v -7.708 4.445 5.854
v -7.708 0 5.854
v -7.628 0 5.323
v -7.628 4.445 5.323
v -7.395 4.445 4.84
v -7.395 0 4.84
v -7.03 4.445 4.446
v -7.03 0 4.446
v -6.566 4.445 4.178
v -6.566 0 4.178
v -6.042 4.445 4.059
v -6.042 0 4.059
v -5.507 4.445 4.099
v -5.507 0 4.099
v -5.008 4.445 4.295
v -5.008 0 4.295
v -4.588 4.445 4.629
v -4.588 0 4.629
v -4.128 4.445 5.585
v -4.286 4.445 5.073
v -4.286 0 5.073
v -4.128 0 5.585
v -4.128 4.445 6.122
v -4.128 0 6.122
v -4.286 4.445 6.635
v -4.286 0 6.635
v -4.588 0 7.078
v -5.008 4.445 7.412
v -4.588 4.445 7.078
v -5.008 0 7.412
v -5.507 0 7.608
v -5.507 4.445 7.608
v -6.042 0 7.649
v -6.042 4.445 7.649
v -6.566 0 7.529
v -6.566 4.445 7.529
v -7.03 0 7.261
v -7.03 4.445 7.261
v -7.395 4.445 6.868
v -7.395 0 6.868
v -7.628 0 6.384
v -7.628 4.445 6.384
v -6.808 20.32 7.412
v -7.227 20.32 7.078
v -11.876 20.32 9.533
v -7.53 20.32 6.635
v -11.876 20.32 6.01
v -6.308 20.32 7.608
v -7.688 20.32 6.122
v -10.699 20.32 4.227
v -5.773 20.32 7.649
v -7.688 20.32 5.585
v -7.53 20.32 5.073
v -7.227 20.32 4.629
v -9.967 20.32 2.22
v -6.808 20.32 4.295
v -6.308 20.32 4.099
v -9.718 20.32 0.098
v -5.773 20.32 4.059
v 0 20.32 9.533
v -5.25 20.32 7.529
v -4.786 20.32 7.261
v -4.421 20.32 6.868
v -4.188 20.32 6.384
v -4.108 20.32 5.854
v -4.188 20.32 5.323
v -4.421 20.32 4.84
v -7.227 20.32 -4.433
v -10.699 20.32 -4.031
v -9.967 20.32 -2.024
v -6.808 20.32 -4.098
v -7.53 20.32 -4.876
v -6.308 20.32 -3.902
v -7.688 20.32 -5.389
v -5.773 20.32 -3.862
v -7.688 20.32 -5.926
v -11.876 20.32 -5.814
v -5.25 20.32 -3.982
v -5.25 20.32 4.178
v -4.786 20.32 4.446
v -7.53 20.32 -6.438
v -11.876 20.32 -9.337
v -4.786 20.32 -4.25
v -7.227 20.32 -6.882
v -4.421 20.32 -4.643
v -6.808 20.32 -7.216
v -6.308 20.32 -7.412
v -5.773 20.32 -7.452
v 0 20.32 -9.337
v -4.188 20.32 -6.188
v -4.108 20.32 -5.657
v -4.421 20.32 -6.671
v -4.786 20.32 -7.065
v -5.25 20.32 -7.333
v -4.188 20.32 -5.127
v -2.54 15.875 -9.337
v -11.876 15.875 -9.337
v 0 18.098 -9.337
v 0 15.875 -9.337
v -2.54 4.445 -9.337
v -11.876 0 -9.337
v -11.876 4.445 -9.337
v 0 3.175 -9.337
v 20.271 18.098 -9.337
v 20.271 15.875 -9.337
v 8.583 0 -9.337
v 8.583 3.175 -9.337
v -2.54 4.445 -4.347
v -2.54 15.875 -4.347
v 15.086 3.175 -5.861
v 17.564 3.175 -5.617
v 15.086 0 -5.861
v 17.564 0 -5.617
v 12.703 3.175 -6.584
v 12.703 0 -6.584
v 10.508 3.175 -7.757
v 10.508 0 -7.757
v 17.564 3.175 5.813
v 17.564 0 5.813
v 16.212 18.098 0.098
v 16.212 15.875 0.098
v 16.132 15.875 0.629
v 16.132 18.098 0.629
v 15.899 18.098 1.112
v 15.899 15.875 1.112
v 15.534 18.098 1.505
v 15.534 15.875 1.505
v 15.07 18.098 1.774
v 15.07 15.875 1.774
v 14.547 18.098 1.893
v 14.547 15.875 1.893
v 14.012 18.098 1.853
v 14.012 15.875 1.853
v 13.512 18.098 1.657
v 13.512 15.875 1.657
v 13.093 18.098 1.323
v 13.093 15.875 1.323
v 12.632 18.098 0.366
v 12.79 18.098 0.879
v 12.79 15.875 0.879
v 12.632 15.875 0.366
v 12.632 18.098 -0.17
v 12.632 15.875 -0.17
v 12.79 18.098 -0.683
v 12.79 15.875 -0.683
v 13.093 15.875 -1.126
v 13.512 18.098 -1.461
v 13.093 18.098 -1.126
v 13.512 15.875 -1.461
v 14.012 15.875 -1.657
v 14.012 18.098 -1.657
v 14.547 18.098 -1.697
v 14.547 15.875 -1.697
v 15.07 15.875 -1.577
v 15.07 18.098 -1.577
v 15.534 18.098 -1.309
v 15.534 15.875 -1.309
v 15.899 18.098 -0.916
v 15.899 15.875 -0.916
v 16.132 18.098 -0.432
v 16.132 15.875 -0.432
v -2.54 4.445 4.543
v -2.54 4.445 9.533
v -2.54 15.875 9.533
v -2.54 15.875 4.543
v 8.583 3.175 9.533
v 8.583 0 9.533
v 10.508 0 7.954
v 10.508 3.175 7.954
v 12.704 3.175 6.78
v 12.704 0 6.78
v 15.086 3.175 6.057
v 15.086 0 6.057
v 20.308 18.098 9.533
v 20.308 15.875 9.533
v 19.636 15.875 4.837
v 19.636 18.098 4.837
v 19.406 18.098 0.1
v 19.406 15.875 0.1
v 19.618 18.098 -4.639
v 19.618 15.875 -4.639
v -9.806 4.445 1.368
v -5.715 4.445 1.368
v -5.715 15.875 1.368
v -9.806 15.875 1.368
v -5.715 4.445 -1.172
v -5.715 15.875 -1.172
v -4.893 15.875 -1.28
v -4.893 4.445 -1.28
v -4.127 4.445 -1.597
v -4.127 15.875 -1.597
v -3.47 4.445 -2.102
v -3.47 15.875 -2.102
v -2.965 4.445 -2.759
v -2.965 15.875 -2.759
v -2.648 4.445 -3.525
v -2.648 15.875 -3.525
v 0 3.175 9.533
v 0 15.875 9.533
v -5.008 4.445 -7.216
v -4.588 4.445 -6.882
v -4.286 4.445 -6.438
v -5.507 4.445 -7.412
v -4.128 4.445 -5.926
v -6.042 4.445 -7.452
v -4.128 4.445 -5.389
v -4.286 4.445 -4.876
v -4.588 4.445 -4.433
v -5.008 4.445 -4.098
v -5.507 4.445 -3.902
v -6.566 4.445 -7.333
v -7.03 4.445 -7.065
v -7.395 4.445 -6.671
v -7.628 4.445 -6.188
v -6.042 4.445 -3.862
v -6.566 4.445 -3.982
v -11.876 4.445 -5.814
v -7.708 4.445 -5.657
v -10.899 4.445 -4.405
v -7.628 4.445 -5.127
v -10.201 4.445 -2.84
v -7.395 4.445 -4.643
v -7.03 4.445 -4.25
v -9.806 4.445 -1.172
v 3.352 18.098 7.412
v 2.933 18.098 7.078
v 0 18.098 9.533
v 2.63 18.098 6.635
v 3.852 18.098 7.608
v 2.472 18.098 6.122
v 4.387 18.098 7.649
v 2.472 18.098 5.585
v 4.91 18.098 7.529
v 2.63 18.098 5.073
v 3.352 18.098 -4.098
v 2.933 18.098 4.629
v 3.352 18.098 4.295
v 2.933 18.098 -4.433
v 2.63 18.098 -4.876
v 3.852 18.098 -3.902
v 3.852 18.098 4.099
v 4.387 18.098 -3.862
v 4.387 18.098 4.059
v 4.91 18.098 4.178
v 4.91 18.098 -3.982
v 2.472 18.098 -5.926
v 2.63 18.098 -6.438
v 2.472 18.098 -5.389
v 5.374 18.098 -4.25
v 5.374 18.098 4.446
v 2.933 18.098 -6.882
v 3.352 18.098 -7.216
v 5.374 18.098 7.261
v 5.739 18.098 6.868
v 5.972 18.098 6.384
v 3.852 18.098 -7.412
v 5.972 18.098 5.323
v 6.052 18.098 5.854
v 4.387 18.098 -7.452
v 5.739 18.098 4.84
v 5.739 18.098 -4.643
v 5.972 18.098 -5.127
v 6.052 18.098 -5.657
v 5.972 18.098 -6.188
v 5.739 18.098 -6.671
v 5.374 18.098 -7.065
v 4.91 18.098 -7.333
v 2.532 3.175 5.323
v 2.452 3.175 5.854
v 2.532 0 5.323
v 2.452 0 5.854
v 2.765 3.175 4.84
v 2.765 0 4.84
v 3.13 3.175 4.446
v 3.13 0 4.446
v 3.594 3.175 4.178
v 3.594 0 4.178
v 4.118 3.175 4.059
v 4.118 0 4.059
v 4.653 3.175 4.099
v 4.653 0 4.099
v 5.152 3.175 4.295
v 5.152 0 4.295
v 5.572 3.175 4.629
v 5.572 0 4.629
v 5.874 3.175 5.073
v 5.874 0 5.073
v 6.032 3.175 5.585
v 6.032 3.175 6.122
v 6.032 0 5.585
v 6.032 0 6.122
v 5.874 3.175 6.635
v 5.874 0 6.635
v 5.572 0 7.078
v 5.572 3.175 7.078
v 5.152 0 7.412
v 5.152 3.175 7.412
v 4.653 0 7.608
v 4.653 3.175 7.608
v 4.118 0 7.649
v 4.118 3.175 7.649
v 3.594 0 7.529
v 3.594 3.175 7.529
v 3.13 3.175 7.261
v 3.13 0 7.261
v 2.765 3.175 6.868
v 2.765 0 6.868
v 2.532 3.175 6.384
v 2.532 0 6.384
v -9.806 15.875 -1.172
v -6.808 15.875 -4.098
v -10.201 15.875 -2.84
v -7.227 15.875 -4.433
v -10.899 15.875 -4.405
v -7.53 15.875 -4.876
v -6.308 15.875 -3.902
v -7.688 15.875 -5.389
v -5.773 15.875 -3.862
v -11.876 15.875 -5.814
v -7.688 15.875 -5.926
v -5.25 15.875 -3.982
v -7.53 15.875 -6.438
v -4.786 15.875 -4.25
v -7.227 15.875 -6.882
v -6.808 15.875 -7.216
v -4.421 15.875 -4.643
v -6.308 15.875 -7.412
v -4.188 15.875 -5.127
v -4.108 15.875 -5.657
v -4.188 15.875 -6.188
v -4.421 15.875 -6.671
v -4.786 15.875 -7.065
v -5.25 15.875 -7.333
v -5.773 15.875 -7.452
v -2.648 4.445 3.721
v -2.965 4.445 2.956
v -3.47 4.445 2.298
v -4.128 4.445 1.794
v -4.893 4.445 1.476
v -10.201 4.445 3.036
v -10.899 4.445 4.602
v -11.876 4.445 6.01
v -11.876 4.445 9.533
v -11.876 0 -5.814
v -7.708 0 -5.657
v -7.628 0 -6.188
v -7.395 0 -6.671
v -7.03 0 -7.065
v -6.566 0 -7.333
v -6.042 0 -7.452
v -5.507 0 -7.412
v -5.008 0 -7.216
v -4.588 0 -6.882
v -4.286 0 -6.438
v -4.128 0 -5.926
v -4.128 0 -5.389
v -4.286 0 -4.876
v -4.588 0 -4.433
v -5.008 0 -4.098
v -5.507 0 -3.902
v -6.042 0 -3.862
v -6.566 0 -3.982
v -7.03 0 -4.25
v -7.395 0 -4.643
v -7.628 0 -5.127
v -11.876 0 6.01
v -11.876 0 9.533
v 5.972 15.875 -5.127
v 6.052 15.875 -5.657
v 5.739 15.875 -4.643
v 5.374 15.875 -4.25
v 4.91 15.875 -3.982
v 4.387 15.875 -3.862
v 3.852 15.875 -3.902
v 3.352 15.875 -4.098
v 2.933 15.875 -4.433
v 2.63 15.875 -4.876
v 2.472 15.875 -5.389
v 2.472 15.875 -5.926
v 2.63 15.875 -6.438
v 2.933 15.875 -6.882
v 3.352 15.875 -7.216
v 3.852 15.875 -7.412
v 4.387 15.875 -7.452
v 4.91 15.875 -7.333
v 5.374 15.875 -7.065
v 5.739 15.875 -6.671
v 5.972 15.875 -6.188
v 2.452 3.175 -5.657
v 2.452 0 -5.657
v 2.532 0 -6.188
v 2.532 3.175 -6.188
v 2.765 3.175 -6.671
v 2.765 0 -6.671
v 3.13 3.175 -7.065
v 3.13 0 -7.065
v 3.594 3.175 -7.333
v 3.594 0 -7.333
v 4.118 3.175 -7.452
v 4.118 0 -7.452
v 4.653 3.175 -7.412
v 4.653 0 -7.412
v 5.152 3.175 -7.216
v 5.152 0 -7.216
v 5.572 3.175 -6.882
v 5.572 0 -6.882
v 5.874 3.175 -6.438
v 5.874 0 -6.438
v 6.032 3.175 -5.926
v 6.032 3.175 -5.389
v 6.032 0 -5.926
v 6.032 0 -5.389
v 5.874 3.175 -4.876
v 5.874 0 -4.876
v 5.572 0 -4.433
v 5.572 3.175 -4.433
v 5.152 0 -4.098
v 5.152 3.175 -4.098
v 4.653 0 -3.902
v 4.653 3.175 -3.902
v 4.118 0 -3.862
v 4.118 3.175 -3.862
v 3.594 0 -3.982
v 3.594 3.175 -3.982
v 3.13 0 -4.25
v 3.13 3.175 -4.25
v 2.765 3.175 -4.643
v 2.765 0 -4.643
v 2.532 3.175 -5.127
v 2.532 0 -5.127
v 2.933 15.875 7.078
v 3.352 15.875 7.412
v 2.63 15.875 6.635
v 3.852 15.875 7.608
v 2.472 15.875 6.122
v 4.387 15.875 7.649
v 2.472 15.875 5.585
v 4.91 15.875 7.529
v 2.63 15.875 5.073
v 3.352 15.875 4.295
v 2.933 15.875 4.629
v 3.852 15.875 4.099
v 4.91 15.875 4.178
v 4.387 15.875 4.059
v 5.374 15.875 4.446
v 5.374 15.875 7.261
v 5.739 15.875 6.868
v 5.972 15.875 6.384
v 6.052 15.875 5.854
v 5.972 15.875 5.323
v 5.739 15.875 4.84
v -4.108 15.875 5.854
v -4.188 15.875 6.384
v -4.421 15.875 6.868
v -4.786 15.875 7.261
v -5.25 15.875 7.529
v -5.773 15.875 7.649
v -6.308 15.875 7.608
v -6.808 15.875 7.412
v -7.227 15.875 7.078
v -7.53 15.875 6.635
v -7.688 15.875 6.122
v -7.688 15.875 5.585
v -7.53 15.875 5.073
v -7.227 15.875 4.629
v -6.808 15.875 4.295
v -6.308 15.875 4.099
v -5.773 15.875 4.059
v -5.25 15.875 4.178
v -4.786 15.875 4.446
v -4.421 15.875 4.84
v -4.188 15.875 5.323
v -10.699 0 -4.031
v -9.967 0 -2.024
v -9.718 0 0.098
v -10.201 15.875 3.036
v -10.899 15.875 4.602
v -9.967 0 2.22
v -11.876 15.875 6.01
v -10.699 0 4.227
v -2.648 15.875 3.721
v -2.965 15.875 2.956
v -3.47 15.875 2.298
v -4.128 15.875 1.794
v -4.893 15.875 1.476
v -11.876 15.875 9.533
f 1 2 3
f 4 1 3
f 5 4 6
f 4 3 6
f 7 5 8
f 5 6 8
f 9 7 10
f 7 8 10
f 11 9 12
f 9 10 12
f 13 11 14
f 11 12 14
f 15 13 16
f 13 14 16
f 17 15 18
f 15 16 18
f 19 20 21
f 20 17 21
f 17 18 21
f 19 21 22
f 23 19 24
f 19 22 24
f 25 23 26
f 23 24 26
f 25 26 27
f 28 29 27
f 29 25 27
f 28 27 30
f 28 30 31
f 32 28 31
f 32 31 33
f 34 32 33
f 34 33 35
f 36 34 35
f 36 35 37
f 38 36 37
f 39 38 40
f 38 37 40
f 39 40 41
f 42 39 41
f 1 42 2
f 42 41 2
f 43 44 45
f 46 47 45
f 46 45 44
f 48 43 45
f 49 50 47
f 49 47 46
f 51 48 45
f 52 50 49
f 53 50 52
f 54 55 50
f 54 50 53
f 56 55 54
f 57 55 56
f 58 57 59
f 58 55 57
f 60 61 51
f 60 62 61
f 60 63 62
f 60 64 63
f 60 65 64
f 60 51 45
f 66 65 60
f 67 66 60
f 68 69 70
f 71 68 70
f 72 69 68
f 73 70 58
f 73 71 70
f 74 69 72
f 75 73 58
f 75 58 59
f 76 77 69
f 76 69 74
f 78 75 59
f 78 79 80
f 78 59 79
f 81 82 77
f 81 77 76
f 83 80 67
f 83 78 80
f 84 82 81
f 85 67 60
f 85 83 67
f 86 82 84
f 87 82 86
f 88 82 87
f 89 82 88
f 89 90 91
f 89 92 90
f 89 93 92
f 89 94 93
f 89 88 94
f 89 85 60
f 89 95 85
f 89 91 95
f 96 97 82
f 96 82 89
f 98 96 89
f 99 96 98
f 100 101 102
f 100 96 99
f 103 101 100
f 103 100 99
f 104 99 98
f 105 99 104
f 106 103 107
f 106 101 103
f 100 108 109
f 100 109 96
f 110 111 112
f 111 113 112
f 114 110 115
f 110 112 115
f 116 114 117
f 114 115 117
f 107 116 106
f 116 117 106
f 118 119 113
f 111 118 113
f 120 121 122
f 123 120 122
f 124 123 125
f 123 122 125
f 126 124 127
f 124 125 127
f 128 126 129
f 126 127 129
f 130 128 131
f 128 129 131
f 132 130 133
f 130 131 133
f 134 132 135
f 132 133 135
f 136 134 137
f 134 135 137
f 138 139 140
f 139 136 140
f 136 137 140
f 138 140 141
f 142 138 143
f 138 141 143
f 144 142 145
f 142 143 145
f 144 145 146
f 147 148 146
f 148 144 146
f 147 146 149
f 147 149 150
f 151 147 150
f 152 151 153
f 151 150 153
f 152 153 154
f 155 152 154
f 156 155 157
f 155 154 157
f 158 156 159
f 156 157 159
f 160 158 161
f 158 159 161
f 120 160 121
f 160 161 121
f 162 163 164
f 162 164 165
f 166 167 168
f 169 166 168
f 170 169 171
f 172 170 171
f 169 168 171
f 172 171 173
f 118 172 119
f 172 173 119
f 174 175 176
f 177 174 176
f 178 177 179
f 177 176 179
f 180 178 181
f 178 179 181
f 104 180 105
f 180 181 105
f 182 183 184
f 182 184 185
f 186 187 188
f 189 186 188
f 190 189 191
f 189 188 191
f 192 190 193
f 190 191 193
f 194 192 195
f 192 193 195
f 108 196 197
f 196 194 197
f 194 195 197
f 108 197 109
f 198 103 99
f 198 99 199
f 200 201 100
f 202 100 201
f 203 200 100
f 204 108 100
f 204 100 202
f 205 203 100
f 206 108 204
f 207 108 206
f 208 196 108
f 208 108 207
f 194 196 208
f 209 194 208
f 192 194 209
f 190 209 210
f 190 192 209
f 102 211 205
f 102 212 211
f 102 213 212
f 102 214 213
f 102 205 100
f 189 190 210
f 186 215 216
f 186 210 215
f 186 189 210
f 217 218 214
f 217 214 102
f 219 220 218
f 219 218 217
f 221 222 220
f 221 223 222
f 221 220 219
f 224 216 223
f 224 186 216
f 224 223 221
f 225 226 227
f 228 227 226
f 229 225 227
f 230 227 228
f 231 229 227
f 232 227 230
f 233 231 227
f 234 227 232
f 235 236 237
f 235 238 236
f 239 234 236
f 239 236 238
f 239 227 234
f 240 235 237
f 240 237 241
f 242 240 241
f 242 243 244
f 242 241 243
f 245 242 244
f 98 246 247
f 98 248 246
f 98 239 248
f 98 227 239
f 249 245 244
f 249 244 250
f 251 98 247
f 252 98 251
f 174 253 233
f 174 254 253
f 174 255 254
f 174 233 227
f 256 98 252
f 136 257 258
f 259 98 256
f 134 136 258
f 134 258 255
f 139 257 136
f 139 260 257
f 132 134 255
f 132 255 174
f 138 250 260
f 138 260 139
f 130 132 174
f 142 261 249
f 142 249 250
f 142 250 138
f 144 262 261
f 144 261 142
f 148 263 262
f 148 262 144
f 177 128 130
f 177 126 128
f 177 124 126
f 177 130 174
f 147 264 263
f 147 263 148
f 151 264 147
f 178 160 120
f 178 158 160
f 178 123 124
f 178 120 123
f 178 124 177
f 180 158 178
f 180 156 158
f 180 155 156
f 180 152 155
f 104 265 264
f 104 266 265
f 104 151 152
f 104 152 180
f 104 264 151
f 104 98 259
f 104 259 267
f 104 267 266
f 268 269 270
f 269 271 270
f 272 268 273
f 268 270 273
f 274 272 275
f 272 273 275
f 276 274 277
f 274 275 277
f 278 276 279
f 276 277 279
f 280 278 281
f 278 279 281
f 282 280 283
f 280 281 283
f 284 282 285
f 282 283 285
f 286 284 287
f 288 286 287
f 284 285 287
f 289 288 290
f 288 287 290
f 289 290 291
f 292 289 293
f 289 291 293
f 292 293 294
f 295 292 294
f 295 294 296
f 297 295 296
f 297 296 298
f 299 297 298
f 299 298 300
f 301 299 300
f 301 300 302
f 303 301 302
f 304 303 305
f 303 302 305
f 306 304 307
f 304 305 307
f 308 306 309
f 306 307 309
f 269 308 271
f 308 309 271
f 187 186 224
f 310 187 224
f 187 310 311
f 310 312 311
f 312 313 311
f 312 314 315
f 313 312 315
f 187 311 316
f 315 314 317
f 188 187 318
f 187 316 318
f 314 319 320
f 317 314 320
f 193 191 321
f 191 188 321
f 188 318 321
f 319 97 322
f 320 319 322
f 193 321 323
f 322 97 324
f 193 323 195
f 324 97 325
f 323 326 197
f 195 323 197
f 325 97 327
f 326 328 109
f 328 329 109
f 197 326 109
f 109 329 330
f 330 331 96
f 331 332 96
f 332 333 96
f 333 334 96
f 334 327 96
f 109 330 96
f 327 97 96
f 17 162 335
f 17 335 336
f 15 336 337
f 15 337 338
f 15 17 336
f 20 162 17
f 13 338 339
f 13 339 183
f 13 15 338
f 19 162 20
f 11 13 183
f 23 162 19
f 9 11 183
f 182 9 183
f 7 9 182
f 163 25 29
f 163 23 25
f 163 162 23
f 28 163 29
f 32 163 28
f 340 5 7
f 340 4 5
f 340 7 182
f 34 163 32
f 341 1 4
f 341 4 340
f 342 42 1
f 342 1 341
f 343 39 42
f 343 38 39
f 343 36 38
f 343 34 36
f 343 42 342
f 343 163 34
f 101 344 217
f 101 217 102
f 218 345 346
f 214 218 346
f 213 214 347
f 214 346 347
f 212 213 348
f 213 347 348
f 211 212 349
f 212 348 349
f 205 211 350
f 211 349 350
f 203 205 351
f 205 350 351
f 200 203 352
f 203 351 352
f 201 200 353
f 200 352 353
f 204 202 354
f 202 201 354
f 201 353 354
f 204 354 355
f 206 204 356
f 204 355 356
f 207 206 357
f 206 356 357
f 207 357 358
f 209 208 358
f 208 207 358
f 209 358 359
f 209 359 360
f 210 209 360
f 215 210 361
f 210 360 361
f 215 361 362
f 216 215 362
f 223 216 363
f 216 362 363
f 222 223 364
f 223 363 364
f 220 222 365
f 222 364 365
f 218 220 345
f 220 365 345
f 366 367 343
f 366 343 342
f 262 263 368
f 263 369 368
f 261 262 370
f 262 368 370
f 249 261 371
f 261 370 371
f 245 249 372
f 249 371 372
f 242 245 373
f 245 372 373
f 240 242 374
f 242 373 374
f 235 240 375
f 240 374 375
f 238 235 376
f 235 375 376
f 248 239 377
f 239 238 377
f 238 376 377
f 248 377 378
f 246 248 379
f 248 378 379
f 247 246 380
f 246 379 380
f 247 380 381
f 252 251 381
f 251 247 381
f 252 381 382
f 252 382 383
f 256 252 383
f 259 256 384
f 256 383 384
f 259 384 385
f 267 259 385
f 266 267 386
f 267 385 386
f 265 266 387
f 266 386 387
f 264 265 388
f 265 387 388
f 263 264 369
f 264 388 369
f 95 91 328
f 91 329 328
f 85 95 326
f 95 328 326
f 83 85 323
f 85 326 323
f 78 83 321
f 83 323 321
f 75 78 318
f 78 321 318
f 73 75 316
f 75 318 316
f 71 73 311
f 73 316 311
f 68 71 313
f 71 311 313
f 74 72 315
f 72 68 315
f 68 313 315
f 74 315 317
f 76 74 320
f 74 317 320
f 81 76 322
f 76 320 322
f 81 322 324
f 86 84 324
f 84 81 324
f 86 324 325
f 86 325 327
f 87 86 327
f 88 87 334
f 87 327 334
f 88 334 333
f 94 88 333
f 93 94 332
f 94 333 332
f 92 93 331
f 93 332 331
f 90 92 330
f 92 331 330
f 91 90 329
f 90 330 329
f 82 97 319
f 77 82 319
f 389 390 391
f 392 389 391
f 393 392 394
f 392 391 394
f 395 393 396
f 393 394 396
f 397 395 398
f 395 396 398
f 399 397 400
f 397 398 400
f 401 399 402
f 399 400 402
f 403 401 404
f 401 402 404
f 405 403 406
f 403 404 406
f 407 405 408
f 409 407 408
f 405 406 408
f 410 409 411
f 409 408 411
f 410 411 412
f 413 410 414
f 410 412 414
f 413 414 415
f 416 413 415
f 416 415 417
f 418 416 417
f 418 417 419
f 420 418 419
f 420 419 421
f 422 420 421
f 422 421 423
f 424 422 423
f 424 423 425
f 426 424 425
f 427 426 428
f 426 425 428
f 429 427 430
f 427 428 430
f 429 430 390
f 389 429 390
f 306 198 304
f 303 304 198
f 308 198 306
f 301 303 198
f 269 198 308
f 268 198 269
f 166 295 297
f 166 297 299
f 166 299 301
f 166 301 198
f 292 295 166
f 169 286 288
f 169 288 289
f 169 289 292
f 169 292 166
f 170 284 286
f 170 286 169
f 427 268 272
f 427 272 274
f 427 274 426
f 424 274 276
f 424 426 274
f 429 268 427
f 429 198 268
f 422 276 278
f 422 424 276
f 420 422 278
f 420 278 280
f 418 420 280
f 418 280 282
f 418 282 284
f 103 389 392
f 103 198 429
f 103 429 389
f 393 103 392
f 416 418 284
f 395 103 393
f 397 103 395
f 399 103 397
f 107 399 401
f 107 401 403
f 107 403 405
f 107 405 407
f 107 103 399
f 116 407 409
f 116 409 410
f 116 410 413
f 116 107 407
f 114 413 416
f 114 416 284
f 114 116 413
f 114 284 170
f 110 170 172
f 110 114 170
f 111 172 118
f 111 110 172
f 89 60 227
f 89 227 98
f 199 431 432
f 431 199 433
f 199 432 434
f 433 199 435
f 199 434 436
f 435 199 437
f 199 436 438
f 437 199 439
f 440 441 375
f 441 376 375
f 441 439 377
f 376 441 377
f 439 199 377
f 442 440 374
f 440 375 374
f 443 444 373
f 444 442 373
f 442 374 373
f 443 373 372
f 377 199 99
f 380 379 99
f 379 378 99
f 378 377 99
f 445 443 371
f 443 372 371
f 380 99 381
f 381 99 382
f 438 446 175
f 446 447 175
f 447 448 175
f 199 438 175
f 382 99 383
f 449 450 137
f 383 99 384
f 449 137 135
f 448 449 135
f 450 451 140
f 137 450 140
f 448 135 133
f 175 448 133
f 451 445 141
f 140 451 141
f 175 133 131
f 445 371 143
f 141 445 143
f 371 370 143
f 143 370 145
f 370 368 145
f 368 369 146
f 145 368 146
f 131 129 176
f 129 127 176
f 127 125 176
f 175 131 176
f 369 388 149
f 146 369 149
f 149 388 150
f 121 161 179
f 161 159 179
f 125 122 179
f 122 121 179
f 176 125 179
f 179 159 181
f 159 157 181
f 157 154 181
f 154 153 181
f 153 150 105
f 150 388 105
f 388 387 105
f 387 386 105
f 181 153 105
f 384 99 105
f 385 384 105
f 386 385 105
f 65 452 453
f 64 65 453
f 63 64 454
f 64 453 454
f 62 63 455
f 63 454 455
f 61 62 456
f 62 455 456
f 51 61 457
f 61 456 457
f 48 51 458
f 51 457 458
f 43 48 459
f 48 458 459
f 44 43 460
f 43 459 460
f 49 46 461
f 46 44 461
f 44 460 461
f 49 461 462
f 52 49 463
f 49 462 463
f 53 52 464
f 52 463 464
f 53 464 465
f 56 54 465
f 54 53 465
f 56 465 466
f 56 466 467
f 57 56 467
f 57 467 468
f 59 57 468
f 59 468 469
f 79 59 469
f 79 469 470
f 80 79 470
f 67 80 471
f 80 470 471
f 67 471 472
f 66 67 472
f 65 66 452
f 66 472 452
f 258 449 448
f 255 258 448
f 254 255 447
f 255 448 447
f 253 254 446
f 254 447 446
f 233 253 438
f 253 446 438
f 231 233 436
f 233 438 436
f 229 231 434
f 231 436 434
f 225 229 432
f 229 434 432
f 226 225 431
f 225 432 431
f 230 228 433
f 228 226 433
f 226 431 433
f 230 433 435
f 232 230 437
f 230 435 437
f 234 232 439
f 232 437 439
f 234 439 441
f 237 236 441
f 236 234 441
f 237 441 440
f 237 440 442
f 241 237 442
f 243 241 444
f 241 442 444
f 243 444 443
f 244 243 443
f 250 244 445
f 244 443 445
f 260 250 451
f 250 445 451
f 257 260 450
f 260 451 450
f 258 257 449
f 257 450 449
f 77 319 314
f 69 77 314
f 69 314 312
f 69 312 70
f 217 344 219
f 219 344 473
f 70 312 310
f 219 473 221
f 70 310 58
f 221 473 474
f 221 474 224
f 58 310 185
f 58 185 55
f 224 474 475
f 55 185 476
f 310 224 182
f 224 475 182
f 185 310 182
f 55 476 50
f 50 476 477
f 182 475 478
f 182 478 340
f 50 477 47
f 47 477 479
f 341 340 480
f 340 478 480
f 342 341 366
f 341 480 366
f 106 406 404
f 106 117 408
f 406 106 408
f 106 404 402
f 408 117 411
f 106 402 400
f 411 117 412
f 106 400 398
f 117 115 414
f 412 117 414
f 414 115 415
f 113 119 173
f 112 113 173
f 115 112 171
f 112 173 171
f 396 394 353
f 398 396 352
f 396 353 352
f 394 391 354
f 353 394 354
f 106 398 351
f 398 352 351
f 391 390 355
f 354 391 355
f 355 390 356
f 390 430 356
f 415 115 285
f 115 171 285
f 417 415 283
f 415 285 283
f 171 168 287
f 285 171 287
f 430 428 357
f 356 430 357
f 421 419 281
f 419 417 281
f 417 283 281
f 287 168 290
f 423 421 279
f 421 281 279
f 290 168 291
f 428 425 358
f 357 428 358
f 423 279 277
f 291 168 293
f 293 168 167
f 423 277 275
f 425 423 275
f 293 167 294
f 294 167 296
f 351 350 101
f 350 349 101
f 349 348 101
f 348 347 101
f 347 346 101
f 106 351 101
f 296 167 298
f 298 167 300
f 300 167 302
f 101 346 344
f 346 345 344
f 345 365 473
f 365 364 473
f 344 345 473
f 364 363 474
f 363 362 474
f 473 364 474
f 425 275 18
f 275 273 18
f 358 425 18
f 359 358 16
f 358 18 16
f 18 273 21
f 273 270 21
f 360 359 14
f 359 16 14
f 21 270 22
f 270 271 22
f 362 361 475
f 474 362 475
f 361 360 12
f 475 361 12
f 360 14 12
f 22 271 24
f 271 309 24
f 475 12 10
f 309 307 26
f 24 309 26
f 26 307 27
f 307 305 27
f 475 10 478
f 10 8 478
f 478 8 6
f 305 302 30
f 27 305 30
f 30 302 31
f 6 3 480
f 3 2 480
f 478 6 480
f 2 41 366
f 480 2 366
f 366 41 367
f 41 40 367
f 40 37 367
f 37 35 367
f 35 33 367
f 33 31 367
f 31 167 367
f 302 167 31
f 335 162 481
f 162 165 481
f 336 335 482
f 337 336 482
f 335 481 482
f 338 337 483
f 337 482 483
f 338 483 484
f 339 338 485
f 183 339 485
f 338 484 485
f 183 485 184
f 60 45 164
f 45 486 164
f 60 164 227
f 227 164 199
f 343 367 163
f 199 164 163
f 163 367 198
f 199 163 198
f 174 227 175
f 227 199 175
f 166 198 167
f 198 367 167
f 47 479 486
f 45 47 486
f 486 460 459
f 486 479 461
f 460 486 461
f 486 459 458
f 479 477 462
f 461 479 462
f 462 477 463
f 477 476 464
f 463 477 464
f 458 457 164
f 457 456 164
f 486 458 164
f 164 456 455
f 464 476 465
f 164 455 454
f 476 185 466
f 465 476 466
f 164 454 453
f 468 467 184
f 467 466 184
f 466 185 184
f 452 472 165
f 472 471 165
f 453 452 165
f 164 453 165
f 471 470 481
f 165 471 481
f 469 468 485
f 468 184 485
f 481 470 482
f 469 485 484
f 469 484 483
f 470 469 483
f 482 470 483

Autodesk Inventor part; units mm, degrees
ref_plane "YZ Plane" through (0, 0, 0) normal (1, 0, 0) x (0, 1, 0)
ref_plane "XZ Plane" through (0, 0, 0) normal (0, 1, 0) x (-1, 0, 0)
ref_plane "XY Plane" through (0, 0, 0) normal (0, 0, 1) x (1, 0, 0)
sketch "Sketch1" plane through (0, 0, 0) normal (0, 1, 0) x (-1, 0, 0)
  arc A0 (-17.5636, 5.8132) -> (-8.5833, 9.5329) centre (-17.5636, 18.5132) ccw
  arc A1 (-17.5636, 5.8132) -> (-8.5833, 9.5329) centre (-17.5636, 18.5132) ccw
  arc A2 (-8.5833, -9.3366) -> (-17.5636, -5.6168) centre (-17.5636, -18.3168) ccw
  arc A3 (-8.5833, -9.3366) -> (-17.5636, -5.6168) centre (-17.5636, -18.3168) ccw
  line L0 (-17.5636, 5.8132) -> (-17.5636, -5.6168)
  line L1 (-8.5833, 9.5329) -> (11.8765, 9.5329)
  line L2 (-8.5833, -9.3366) -> (11.1934, -9.3366)
  arc A4 (11.8765, 6.0101) -> (11.8765, -5.8137) centre (18.8929, 0.0982) ccw
  line L3 (11.8765, -9.3366) -> (11.1934, -9.3366)
  line L4 (11.8765, 9.5329) -> (11.8765, 6.0101)
  line L5 (11.8765, -5.8137) -> (11.8765, -9.3366)
  circle A5 centre (5.9079, 5.8536) radius 1.8
  circle A6 centre (5.9079, 5.8536) radius 1.8
  circle A7 centre (-4.2521, 5.8536) radius 1.8
  circle A8 centre (-4.2521, 5.8536) radius 1.8
  circle A9 centre (5.9079, -5.6573) radius 1.8
  circle A10 centre (5.9079, -5.6573) radius 1.8
  circle A11 centre (-4.2521, -5.6573) radius 1.8
  circle A12 centre (-4.2521, -5.6573) radius 1.8
  point P0 (12.4052, 6.5859)
extrude "Extrusion1" add sketch "Sketch1" along normal blind 4.445
sketch "Sketch2" plane through (0, 4.445, 0) normal (0, 1, 0) x (1, 0, 0)
  line L0 (-11.8765, -9.5329) -> (8.5833, -9.5329) projected
  line L1 (8.5833, 9.3366) -> (-11.8765, 9.3366) projected
  line L2 (0, -9.5329) -> (-2.54, -9.5329)
  line L3 (-2.54, 9.3366) -> (0, 9.3366)
  line L4 (0, 9.3366) -> (0, -9.5329)
  line L5 (-2.54, -1.3682) -> (-9.8062, -1.3682)
  line L6 (-2.54, 1.1718) -> (-9.8062, 1.1718)
  arc A0 (-11.8765, -6.0101) -> (-11.8765, 5.8137) centre (-18.8929, -0.0982) ccw projected
  arc A1 (-9.8062, -1.3682) -> (-9.8062, 1.1718) centre (-18.8929, -0.0982) ccw
  line L7 (-2.54, -9.5329) -> (-2.54, -1.3682)
  line L8 (-2.54, 1.1718) -> (-2.54, 9.3366)
  point P0 (0, 0)
  dimension "d2" = 2.54
extrude "Extrusion2" add sketch "Sketch2" along normal blind 11.43
sketch "Sketch3" plane through (0, 4.445, 0) normal (0, 1, 0) x (1, 0, 0)
  line L0 (0, -11.1934) -> (18.2988, -11.1934)
  line L1 (18.2988, -11.1934) -> (18.2988, 11.7125)
  line L2 (18.2988, 11.7125) -> (0, 11.7125)
  line L3 (0, 11.7125) -> (0, -11.1934)
  point P0 (0, 0)
extrude "Extrusion3" cut sketch "Sketch3" against normal blind 1.27
sketch "Sketch4" plane through (0, 15.875, 0) normal (0, 1, 0) x (1, 0, 0)
  arc A0 (20.271, 9.3366) -> (20.3081, -9.5329) centre (70.2056, 0) ccw
  line L0 (8.5833, -9.5329) -> (0, -9.5329) projected
  line L1 (-11.8765, -6.0101) -> (-11.8765, -9.5329) projected
  line L2 (7.4252, -9.5329) -> (-11.8765, -9.5329)
  line L3 (-11.8765, -9.5329) -> (-11.8765, -6.0101)
  arc A1 (-11.8765, -6.0101) -> (-11.8765, 5.8137) centre (-18.8929, -0.0982) ccw projected
  line L4 (-11.8765, 9.3366) -> (-11.8765, 5.8137) projected
  line L5 (-11.8765, 5.8137) -> (-11.8765, 9.3366)
  line L6 (-11.8765, 9.3366) -> (7.3957, 9.3366)
  line L7 (0, 9.3366) -> (8.5833, 9.3366) projected
  arc A2 (-11.8765, -6.0101) -> (-11.8765, 5.8137) centre (-18.8929, -0.0982) ccw
  line L8 (-11.8765, -9.5329) -> (8.5833, -9.5329) projected
  line L9 (-11.8765, -9.5329) -> (20.3081, -9.5329)
  line L10 (8.5833, 9.3366) -> (-11.8765, 9.3366) projected
  line L11 (-11.8765, 9.3366) -> (20.271, 9.3366)
  circle A3 centre (-5.9079, -5.8536) radius 1.8 projected
  circle A4 centre (-5.9079, -5.8536) radius 1.8
  circle A5 centre (-5.9079, 5.6573) radius 1.8 projected
  circle A6 centre (-5.9079, 5.6573) radius 1.8
  circle A7 centre (4.2521, -5.8536) radius 1.8 projected
  circle A8 centre (4.2521, -5.8536) radius 1.8
  circle A9 centre (4.2521, 5.6573) radius 1.8 projected
  circle A10 centre (4.2521, 5.6573) radius 1.8
  circle A11 centre (14.4121, -0.0982) radius 1.8
  point P0 (0, 0)
  dimension "d10" = 101.6
  dimension "d13" = 3.6
extrude "Extrusion4" add sketch "Sketch4" along normal blind 4.445
sketch "Sketch5" plane through (0, 20.32, 0) normal (0, 1, 0) x (1, 0, 0)
  line L0 (0, -9.5329) -> (20.3081, -9.5329) projected
  line L1 (20.3081, -9.5329) -> (0, -9.5329)
  line L2 (0, -9.5329) -> (0, 9.3366) projected
  line L3 (0, -9.5329) -> (0, 9.3366)
  line L4 (20.271, 9.3366) -> (0, 9.3366) projected
  line L5 (0, 9.3366) -> (20.271, 9.3366)
  arc A0 (20.271, 9.3366) -> (20.3081, -9.5329) centre (70.2056, 0) ccw
  circle A1 centre (4.2521, -5.8536) radius 1.8 projected
  circle A2 centre (4.2521, -5.8536) radius 1.8
  circle A3 centre (4.2521, 5.6573) radius 1.8 projected
  circle A4 centre (4.2521, 5.6573) radius 1.8
  circle A5 centre (14.4121, -0.0982) radius 1.8 projected
  circle A6 centre (14.4121, -0.0982) radius 1.8
  point P0 (0, 0)
extrude "Extrusion5" cut sketch "Sketch5" against normal blind 2.2225
fillet "Fillet1" radius 3.175 2 edges at (-2.54, 10.16, 1.3682) (-2.54, 10.16, -1.1718)
sketch "Sketch6" plane through (0, 20.32, 0) normal (0, 1, 0) x (1, 0, 0)
  circle A0 centre (-5.9079, -5.8536) radius 1.8 projected
  circle A1 centre (-5.9079, -5.8536) radius 1.8
  circle A2 centre (-5.9079, 5.6573) radius 1.8 projected
  circle A3 centre (-5.9079, 5.6573) radius 1.8
  circle A4 centre (4.2521, -5.8536) radius 1.8 projected
  circle A5 centre (4.2521, -5.8536) radius 1.8
  circle A6 centre (4.2521, 5.6573) radius 1.8 projected
  circle A7 centre (4.2521, 5.6573) radius 1.8
  circle A8 centre (14.4121, -0.0982) radius 1.8 projected
  circle A9 centre (14.4121, -0.0982) radius 1.8
  line L0 (-11.8765, -9.5329) -> (-2.54, -9.5329) projected
  arc A10 (20.271, 9.3366) -> (20.3081, -9.5329) centre (70.2056, 0) ccw projected
  line L1 (-11.8765, -9.5329) -> (20.3081, -9.5329)
  line L2 (-11.8765, -6.0101) -> (-11.8765, -9.5329) projected
  line L3 (-11.8765, -9.5329) -> (-11.8765, -6.0101)
  line L4 (-11.8765, 9.3366) -> (-11.8765, 5.8137) projected
  line L5 (-11.8765, 5.8137) -> (-11.8765, 9.3366)
  line L6 (0, 9.3366) -> (20.271, 9.3366) projected
  line L7 (-11.8765, 9.3366) -> (20.271, 9.3366)
  arc A11 (-11.8765, -6.0101) -> (-11.8765, 5.8137) centre (-18.8929, -0.0982) ccw
  line L8 (0, -9.5329) -> (0, 9.3366)
  line L9 (8.5833, 9.3366) -> (-11.8765, 9.3366) projected
  point P0 (0, 0)
properties part number "MountingBracket"
